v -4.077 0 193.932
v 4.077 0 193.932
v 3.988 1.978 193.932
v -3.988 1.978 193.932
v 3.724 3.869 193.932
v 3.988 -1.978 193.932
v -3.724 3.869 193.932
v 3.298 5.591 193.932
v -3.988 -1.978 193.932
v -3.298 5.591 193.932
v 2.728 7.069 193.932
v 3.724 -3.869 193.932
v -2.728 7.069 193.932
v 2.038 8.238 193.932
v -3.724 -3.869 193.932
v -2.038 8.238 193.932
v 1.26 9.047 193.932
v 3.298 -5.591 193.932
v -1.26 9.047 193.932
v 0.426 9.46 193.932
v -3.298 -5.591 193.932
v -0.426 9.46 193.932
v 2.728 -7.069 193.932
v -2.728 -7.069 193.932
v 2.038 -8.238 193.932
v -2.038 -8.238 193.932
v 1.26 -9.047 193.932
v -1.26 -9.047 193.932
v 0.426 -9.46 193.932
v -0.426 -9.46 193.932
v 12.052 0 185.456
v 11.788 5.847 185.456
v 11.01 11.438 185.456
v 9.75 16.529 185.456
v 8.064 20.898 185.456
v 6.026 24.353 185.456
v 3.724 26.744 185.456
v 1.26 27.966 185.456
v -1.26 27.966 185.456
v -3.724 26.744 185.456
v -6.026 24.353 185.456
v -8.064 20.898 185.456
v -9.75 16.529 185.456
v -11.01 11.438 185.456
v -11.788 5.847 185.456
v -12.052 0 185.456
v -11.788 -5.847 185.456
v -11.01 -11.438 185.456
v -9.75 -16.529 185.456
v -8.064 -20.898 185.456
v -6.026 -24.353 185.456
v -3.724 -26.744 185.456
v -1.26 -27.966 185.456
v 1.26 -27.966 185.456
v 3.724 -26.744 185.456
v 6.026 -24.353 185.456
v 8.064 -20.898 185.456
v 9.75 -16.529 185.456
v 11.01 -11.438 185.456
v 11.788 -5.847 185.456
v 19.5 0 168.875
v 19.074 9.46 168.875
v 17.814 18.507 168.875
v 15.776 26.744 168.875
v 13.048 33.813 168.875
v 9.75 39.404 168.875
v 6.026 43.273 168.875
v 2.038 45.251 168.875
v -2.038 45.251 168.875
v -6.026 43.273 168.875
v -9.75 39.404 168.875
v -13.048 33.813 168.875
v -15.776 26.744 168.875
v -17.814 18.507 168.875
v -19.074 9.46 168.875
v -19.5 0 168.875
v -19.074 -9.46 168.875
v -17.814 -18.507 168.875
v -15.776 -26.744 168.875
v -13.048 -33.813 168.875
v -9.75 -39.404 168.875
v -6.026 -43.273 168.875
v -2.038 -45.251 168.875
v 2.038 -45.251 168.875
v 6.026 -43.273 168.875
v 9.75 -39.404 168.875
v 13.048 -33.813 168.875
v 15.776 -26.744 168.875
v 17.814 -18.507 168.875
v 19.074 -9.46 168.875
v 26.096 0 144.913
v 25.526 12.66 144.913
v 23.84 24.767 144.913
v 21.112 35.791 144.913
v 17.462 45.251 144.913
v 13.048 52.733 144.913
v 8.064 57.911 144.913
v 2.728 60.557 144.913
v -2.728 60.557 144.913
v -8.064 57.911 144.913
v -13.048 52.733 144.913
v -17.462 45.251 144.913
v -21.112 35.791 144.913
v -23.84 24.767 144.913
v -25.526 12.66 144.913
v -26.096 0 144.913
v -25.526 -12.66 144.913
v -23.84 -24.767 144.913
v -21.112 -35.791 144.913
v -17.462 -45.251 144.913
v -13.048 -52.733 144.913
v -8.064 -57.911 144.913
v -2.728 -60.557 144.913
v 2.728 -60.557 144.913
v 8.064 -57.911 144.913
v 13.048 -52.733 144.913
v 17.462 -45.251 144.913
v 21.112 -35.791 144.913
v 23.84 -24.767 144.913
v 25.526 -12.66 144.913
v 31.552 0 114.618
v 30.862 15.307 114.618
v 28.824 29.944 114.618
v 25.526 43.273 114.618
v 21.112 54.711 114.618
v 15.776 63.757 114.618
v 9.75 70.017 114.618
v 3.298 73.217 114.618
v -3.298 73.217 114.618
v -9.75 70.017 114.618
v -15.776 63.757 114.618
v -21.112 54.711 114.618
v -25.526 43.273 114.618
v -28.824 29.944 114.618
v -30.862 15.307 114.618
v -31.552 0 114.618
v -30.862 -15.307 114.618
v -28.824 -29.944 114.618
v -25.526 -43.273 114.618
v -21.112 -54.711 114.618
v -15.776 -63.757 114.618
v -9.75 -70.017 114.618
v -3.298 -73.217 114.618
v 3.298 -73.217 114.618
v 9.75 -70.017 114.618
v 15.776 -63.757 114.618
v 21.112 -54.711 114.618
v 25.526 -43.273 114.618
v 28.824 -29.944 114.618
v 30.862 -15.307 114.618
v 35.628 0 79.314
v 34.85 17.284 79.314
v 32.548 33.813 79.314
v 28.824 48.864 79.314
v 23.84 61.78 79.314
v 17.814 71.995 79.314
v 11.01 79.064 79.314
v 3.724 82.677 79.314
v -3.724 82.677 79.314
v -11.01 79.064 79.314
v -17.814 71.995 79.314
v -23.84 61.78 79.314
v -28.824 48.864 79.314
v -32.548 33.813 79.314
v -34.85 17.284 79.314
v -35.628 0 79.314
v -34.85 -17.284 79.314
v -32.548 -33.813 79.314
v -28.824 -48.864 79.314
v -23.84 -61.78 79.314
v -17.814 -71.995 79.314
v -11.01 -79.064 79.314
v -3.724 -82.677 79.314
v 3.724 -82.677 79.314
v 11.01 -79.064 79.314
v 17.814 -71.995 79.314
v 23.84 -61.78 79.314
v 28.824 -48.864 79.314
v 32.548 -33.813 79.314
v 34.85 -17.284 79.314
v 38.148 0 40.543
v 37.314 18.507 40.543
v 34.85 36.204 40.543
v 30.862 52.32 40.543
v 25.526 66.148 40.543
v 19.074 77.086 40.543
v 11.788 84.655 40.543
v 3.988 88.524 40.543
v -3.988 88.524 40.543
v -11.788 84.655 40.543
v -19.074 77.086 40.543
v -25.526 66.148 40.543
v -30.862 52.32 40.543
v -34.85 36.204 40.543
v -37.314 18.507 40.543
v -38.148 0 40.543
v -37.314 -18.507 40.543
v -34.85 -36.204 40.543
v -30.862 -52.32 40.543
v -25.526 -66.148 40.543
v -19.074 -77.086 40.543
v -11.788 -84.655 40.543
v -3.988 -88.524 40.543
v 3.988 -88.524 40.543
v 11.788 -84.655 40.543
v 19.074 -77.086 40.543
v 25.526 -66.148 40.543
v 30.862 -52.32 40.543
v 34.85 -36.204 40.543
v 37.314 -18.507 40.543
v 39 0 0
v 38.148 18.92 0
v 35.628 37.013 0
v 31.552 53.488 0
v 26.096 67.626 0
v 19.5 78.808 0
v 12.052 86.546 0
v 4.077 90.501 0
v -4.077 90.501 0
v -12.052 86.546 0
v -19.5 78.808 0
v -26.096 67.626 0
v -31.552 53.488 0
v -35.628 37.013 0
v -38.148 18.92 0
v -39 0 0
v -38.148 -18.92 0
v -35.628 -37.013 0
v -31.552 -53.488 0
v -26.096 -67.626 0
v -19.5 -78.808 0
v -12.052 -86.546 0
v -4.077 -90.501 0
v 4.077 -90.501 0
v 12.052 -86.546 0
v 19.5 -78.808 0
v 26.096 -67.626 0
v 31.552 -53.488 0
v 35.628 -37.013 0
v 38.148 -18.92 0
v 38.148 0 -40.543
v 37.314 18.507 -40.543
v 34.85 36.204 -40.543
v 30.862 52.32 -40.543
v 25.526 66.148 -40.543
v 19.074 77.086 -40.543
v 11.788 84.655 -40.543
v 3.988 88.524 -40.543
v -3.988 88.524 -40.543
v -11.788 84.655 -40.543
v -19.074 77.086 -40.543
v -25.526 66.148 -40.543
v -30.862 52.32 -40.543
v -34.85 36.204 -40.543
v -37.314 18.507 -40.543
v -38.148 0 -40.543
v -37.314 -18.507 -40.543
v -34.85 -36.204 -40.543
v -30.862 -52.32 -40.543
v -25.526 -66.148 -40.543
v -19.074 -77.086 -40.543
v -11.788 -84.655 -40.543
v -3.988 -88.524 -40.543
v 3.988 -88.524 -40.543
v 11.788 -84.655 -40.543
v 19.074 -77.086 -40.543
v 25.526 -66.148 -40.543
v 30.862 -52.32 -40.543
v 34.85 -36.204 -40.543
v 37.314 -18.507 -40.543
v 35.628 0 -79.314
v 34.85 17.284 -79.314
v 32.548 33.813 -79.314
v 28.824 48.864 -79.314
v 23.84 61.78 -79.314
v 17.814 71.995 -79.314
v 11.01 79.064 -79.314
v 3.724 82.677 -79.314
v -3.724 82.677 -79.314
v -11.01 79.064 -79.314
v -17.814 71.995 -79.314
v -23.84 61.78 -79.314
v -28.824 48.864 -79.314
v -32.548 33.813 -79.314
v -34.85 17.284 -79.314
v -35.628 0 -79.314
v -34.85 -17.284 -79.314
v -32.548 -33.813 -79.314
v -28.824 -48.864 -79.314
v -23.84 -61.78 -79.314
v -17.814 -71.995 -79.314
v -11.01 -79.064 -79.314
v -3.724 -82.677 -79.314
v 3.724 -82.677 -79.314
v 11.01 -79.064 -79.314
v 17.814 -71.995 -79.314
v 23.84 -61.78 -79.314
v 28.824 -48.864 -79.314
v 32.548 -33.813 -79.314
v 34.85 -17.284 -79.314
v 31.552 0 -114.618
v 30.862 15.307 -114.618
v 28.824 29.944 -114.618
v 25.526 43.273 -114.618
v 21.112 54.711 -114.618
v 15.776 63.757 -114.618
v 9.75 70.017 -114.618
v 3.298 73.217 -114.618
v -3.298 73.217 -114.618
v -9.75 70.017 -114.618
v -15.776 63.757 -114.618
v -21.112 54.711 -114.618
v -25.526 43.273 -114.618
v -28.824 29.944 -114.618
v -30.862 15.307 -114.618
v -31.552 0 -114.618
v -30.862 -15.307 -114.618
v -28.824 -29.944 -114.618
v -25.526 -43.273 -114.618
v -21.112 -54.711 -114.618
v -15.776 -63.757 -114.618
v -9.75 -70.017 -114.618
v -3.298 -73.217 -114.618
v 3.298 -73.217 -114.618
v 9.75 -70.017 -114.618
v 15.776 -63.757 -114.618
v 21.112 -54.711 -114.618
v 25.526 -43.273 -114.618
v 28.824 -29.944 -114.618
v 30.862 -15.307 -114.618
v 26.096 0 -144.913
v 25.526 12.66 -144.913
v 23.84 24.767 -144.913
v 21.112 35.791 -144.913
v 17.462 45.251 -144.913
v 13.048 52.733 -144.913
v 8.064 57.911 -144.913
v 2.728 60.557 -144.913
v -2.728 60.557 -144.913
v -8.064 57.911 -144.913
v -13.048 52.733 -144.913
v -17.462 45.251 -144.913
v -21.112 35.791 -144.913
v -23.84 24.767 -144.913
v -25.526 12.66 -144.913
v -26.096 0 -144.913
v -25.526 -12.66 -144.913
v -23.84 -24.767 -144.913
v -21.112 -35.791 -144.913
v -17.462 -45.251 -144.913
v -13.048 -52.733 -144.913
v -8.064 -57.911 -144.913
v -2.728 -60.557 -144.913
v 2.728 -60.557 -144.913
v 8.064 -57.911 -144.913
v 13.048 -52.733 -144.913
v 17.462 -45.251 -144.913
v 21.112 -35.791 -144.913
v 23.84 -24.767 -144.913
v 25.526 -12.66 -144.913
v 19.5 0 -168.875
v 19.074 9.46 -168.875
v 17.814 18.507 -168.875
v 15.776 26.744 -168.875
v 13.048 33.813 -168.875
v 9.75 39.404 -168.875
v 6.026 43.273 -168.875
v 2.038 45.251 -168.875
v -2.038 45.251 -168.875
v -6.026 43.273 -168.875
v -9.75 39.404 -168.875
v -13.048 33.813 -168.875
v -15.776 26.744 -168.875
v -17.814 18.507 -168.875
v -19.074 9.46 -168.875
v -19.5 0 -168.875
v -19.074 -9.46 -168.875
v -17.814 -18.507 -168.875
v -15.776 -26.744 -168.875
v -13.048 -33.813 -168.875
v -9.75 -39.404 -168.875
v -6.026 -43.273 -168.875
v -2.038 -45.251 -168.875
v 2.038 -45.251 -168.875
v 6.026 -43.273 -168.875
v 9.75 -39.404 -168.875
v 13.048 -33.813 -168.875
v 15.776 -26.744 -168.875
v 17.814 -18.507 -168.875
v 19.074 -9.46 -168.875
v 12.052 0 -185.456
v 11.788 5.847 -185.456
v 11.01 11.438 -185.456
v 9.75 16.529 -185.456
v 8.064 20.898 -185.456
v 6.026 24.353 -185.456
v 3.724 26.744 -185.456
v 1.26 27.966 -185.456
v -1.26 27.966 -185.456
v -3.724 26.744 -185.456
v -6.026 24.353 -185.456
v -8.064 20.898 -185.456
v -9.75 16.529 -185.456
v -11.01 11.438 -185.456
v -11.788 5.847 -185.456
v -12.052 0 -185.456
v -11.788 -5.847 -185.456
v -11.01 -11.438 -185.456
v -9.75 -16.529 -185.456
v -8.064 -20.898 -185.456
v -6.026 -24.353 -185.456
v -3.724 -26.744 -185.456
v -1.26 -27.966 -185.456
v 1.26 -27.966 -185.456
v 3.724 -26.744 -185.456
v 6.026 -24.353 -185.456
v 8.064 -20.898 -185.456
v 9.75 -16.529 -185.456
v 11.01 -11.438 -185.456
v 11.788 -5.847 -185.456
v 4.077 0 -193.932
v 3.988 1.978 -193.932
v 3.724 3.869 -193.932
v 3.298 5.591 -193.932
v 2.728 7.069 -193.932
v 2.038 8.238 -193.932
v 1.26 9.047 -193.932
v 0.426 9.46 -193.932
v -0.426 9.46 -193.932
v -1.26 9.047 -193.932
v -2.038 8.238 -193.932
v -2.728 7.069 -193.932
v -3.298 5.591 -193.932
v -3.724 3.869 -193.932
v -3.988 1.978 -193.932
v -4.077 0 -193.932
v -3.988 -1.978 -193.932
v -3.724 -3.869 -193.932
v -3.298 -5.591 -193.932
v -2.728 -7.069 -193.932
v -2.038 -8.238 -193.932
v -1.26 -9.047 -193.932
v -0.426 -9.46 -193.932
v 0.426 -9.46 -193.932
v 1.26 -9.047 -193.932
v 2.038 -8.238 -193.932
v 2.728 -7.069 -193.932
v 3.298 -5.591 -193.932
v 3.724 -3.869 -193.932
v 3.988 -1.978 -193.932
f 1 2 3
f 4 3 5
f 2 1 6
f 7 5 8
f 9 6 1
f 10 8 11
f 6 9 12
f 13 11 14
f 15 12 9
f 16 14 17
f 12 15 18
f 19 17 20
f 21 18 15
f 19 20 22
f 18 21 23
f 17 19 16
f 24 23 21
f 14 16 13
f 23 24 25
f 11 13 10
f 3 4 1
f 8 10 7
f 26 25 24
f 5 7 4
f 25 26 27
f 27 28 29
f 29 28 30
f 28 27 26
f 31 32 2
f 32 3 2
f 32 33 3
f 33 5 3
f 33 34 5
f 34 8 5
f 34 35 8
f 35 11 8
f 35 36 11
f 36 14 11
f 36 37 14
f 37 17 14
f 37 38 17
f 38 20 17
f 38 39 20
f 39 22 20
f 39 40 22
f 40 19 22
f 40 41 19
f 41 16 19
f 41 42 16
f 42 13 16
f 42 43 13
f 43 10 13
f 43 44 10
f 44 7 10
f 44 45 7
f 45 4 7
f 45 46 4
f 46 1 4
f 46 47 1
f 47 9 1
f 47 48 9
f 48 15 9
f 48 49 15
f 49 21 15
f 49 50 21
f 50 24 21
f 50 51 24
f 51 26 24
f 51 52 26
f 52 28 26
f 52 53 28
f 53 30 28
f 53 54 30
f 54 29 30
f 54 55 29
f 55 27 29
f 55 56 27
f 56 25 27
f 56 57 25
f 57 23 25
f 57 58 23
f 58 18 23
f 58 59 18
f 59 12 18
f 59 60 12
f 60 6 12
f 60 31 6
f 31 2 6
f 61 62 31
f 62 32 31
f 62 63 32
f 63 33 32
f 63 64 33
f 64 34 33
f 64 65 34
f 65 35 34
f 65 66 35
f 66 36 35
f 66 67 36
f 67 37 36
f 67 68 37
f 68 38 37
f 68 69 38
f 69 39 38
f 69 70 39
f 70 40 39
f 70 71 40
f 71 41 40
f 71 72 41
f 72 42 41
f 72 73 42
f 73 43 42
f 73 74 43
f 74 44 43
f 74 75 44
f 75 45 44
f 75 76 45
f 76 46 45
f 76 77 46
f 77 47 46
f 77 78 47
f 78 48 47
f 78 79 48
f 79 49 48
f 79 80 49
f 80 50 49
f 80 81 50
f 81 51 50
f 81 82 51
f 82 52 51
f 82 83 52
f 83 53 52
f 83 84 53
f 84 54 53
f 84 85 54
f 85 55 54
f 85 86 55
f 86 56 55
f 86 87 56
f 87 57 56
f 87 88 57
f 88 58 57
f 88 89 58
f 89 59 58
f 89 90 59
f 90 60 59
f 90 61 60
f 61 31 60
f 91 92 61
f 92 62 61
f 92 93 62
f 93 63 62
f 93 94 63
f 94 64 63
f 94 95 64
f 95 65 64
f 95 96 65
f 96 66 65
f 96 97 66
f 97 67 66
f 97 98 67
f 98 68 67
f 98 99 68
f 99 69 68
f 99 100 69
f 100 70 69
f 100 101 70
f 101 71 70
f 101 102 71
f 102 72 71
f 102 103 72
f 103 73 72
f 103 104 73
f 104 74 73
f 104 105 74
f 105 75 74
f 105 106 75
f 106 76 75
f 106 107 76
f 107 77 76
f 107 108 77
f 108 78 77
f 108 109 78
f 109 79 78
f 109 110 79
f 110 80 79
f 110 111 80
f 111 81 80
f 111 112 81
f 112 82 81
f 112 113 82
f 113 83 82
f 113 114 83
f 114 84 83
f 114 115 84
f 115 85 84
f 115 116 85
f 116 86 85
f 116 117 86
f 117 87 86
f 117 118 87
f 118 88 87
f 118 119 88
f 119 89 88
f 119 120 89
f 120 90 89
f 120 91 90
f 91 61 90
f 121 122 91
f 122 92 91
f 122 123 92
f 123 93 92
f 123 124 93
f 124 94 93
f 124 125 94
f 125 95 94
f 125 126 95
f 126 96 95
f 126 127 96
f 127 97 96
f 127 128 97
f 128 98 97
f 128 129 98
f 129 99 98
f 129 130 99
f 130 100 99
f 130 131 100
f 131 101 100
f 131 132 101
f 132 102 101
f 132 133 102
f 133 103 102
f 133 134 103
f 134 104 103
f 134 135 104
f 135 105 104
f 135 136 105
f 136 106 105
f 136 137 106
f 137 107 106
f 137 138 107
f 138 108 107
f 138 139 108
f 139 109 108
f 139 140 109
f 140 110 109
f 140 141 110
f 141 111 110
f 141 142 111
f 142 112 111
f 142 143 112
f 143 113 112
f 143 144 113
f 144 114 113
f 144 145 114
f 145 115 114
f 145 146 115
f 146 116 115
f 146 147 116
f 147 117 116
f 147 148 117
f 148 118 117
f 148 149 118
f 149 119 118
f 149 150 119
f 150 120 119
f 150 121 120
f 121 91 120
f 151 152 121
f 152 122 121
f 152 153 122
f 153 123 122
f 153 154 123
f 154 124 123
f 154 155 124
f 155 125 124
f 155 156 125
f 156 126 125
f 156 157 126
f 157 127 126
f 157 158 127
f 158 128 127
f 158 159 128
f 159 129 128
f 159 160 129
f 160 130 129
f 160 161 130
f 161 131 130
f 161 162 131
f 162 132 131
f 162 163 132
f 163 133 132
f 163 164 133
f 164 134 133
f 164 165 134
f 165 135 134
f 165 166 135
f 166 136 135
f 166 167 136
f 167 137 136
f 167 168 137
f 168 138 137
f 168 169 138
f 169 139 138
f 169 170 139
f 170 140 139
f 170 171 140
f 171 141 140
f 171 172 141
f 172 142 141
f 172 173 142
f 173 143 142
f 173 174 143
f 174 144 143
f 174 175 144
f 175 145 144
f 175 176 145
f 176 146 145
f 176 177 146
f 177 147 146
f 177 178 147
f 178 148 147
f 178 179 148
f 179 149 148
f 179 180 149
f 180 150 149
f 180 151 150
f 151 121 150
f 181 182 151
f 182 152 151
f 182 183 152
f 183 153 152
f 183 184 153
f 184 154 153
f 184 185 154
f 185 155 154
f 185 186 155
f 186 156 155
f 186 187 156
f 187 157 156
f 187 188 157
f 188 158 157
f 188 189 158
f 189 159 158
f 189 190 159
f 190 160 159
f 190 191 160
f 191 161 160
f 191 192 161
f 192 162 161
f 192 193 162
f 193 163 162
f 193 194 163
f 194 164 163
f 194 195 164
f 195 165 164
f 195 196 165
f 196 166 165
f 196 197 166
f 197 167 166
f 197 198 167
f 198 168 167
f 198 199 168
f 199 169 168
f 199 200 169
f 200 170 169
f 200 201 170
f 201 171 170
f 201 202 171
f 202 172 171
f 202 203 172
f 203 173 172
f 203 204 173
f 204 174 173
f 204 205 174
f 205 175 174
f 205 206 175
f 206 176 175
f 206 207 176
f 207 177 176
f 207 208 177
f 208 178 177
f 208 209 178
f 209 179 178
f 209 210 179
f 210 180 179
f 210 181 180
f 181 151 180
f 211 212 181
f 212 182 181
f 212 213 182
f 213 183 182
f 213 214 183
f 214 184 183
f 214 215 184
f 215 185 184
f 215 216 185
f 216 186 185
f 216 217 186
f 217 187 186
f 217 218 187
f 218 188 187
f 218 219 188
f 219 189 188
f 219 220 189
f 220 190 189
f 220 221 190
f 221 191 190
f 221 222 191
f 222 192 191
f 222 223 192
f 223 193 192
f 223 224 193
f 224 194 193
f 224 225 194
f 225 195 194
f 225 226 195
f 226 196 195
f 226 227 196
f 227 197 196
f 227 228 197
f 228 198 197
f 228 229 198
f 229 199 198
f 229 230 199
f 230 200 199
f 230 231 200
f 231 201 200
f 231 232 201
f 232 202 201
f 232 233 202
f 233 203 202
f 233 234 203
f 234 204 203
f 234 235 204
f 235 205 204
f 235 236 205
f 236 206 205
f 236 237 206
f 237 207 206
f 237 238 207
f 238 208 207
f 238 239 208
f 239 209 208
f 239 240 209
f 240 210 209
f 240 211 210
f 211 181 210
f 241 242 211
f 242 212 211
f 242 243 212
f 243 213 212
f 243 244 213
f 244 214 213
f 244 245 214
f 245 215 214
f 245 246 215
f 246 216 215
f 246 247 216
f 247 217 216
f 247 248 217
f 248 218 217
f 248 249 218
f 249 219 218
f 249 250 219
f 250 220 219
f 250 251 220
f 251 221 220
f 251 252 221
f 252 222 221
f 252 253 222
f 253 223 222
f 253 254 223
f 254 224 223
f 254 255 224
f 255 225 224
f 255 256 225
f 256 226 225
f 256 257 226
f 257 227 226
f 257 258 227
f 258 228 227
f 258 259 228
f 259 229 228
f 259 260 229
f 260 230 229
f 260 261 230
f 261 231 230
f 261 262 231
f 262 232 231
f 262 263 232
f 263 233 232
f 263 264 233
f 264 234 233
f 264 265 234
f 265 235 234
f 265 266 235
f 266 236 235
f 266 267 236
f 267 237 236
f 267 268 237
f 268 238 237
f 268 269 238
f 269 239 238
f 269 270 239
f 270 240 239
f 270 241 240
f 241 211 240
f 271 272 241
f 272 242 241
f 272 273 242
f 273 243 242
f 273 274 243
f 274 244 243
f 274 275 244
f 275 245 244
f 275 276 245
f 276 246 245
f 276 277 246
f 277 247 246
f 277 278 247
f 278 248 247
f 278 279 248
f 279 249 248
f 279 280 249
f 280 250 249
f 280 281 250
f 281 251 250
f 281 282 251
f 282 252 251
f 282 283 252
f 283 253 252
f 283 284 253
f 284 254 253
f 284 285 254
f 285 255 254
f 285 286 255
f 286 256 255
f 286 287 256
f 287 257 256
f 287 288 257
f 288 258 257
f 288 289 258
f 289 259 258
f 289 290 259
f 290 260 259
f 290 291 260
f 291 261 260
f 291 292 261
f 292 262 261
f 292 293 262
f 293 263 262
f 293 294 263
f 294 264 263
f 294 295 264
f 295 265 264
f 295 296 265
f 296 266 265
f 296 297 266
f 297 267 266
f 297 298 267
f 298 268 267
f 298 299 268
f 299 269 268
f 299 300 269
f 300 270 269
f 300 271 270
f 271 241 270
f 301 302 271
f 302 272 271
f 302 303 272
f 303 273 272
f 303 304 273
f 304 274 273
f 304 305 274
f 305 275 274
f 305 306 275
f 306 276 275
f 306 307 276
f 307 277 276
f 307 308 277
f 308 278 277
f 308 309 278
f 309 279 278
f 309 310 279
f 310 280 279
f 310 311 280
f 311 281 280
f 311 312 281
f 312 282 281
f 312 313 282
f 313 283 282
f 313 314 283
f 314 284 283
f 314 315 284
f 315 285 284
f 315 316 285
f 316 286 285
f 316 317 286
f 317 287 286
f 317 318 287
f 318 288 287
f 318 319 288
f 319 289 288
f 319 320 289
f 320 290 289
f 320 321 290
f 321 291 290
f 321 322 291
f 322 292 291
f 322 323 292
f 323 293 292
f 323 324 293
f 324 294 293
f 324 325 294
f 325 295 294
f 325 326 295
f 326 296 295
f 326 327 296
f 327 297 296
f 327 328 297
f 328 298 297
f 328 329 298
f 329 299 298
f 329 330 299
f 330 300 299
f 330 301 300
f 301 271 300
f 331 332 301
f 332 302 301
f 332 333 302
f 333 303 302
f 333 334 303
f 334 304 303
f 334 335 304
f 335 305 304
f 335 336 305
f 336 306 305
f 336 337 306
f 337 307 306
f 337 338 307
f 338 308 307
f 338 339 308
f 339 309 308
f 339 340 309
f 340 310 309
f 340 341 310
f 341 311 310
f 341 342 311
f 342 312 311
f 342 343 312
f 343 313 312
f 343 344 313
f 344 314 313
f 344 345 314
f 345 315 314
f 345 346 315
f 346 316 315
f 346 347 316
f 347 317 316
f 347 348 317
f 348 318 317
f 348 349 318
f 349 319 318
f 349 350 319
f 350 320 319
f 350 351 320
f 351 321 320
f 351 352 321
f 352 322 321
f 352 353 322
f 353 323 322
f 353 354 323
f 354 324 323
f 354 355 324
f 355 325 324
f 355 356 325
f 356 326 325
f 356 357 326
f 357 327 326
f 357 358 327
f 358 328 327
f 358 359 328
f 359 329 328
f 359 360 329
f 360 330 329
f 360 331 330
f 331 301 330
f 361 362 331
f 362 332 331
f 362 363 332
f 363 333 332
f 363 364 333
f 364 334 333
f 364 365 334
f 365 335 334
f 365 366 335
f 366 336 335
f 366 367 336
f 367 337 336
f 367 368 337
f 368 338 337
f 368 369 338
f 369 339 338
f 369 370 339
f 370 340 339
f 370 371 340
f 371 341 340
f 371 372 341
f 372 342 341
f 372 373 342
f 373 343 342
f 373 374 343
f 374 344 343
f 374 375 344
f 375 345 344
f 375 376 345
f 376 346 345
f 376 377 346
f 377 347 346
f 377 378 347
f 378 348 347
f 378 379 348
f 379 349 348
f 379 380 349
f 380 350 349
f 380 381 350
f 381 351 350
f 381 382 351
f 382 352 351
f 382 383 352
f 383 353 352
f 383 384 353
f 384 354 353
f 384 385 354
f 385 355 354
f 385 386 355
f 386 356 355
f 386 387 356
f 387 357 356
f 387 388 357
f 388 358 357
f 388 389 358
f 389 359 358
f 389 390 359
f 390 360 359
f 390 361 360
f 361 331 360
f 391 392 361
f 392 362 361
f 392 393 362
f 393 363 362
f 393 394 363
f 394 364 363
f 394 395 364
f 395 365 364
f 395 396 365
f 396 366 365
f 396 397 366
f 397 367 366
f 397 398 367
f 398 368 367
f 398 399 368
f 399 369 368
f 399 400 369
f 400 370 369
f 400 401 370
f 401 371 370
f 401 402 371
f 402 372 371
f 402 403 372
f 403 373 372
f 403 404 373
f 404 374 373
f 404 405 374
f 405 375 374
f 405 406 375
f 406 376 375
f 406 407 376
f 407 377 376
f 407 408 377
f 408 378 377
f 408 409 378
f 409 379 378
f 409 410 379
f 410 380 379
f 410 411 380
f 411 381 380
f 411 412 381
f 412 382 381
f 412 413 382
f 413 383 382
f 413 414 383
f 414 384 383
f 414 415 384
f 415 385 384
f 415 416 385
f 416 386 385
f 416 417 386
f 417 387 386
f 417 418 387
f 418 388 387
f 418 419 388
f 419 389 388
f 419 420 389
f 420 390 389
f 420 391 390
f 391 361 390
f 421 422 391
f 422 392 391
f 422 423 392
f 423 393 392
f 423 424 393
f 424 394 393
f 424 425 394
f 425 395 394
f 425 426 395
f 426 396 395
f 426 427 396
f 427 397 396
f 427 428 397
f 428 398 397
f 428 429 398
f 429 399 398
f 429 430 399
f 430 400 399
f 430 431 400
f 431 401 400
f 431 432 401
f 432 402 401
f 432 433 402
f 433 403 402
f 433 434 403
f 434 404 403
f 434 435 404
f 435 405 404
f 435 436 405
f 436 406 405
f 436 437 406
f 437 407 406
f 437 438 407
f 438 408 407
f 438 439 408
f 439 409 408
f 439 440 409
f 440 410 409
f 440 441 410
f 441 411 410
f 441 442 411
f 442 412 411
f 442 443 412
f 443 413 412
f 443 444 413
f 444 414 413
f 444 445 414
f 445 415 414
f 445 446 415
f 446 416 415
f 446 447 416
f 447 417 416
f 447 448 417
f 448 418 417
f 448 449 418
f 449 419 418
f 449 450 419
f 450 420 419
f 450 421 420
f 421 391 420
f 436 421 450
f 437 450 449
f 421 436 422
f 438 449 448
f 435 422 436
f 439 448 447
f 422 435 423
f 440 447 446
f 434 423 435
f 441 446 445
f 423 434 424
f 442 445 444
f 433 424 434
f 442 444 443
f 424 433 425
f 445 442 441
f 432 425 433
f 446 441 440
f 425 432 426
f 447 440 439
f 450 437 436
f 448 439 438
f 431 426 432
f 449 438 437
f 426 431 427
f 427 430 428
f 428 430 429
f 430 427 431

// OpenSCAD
// Generated by SolidPython 1.0.1 on 2020-07-29 00:46:45


scale(v = [3, 7, 15]) {
	sphere(r = 13);
}
/***********************************************
*********      SolidPython code:      **********
************************************************
 
# import packages: SolidPython
from solid import *
from solid.utils import *
from itertools import chain, combinations, permutations


class Resize:

    def __init__(self, scad_file):
        self.scad_file = scad_file
        #self.scad_file = import_scad(scad_file)
        # cone/cylinder param:
        self.r1 = 0
        self.r2 = 0
        self.h = 0
        # rectangular prism param:
        self.w = 0
        self.l = 0
        # ellipse param:
        self.r = 0

    # import OpenScad code (file name corresponds to shape)


    # classify shape + parameters
    def assign(self, param1, param2, param3):
        if self.scad_file == 'cone.scad':
            self.r1 = param1
            self.r2 = param2
            self.h = param3
        elif self.scad_file == 'cylinder.scad':
            self.r1 = param1
            self.r2 = param2
            self.h = param3
        elif self.scad_file == 'rectangularPrism.scad':
            self.h = param1
            self.l = param2
            self.w = param3
        else:
            self.r = param1
            self.h = param2

    # resize parameters
    def iterate(self):
        x = range(3, 20, 2)
        i = 1
        if self.scad_file == 'cone.scad':
            tempList = list(permutations(x, 2))
            for temp in tempList:
                param1 = temp[0]
                param2 = temp[1]
                filepath = 'produced_scad_files/' + 'cone' + str(param1) + '_' + str(param2) + '_' + '.scad'
                scad_render_to_file(cylinder(h=param1, r1=param2, r2=0), filepath)

        elif self.scad_file == 'cylinder.scad':
            tempList = list(permutations(x, 3))
            for temp in tempList:
                param1 = temp[0]
                param2 = temp[1]
                filepath = 'produced_scad_files/' + 'cylinder' + str(param1) + '_' + str(param2) + '_' + '.scad'
                scad_render_to_file(cylinder(h=param1, r1=param2, r2=param2), filepath)

        elif self.scad_file == 'rectangularPrism.scad':
            tempList = list(permutations(x, 3))
            for temp in tempList:
                param1 = temp[0]
                param2 = temp[1]
                param3 = temp[2]
                filepath = 'produced_scad_files/' + 'rectangularPrism' + str(param1) + '_' + str(param2) + '_' + str(
                    param3) + '.scad'
                scad_render_to_file(cube(size=(param1, param2, param3)), filepath)

        elif self.scad_file == 'ellipse.scad':
            tempList = list(permutations(x, 4))
            for temp in tempList:
                param1 = temp[0]
                param2 = temp[1]
                param3 = temp[2]
                param4 = temp[3]
                filepath = 'produced_scad_files/' + 'ellipse' + str(param1) + '_' + str(param2) + '_' + str(param3) + '_' + str(param4) + '.scad'
                scad_render_to_file(scale([param1, param2, param3])(sphere(r=param4)), filepath)

    def render_to_scadfile(self):
        scad_render_to_file(scad, 'example.scad') 
 
************************************************/
